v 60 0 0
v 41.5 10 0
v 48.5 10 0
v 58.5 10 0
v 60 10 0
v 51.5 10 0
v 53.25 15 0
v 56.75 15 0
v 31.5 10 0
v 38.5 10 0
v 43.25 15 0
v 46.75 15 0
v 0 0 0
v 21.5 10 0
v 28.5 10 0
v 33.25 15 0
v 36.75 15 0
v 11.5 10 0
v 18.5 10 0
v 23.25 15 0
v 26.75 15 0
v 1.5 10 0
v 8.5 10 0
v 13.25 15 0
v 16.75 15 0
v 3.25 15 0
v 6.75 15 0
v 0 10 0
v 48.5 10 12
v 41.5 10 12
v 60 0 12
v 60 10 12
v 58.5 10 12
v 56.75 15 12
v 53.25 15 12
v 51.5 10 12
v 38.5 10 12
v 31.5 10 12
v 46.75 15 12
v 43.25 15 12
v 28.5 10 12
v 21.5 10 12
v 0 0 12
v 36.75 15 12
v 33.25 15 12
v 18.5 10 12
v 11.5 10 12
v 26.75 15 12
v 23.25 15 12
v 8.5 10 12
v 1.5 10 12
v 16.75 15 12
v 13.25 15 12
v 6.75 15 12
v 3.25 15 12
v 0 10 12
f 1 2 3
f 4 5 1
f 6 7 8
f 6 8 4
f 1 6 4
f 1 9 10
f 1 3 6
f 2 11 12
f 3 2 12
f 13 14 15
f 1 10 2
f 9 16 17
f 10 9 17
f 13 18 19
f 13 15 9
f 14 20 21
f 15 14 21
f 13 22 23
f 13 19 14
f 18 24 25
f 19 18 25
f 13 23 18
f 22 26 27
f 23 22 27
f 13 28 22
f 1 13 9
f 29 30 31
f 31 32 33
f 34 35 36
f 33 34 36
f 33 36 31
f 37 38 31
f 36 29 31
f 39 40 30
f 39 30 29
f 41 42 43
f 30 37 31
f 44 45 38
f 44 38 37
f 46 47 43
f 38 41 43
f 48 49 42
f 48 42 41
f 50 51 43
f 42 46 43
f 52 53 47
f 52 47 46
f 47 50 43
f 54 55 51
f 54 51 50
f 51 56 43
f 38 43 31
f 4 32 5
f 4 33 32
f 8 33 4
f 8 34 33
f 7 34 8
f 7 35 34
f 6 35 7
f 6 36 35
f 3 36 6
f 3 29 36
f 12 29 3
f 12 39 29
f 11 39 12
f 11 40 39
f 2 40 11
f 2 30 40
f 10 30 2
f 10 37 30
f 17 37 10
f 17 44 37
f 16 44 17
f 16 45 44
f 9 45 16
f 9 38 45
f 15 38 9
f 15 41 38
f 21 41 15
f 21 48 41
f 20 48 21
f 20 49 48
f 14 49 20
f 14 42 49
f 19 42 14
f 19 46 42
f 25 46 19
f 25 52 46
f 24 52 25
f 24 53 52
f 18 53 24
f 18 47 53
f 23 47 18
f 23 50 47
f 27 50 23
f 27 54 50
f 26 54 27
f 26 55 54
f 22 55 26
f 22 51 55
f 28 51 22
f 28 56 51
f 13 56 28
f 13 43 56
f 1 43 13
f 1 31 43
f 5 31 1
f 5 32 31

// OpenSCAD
$fn = 32;

// ----------------------------------------------------------------------
// Gear rack: 6 teeth, pitch 10 mm
// ----------------------------------------------------------------------

// --- parameters (mm) ---
teeth = 6;                // number of teeth
pitch = 10;               // tooth pitch, X
root_w = 7;               // tooth width at the root
tip_w = 3.5;              // tooth width at the tip
base_h = 10;              // rack body height, Y
tooth_h = 5;              // tooth height above the body
plate_t = 12;             // rack width, Z (extrusion height)

rack_l = teeth * pitch;  // overall length
total_h = base_h + tooth_h;  // overall height

profile = [[0, 0], [60, 0], [60, 10], [58.5, 10], [56.75, 15], [53.25, 15], [51.5, 10], [48.5, 10], [46.75, 15], [43.25, 15], [41.5, 10], [38.5, 10], [36.75, 15], [33.25, 15], [31.5, 10], [28.5, 10], [26.75, 15], [23.25, 15], [21.5, 10], [18.5, 10], [16.75, 15], [13.25, 15], [11.5, 10], [8.5, 10], [6.75, 15], [3.25, 15], [1.5, 10], [0, 10]];  // primary outline, 28 points, counter clockwise

// --- the one profile operation ---
linear_extrude(height = plate_t) polygon(points = profile);
